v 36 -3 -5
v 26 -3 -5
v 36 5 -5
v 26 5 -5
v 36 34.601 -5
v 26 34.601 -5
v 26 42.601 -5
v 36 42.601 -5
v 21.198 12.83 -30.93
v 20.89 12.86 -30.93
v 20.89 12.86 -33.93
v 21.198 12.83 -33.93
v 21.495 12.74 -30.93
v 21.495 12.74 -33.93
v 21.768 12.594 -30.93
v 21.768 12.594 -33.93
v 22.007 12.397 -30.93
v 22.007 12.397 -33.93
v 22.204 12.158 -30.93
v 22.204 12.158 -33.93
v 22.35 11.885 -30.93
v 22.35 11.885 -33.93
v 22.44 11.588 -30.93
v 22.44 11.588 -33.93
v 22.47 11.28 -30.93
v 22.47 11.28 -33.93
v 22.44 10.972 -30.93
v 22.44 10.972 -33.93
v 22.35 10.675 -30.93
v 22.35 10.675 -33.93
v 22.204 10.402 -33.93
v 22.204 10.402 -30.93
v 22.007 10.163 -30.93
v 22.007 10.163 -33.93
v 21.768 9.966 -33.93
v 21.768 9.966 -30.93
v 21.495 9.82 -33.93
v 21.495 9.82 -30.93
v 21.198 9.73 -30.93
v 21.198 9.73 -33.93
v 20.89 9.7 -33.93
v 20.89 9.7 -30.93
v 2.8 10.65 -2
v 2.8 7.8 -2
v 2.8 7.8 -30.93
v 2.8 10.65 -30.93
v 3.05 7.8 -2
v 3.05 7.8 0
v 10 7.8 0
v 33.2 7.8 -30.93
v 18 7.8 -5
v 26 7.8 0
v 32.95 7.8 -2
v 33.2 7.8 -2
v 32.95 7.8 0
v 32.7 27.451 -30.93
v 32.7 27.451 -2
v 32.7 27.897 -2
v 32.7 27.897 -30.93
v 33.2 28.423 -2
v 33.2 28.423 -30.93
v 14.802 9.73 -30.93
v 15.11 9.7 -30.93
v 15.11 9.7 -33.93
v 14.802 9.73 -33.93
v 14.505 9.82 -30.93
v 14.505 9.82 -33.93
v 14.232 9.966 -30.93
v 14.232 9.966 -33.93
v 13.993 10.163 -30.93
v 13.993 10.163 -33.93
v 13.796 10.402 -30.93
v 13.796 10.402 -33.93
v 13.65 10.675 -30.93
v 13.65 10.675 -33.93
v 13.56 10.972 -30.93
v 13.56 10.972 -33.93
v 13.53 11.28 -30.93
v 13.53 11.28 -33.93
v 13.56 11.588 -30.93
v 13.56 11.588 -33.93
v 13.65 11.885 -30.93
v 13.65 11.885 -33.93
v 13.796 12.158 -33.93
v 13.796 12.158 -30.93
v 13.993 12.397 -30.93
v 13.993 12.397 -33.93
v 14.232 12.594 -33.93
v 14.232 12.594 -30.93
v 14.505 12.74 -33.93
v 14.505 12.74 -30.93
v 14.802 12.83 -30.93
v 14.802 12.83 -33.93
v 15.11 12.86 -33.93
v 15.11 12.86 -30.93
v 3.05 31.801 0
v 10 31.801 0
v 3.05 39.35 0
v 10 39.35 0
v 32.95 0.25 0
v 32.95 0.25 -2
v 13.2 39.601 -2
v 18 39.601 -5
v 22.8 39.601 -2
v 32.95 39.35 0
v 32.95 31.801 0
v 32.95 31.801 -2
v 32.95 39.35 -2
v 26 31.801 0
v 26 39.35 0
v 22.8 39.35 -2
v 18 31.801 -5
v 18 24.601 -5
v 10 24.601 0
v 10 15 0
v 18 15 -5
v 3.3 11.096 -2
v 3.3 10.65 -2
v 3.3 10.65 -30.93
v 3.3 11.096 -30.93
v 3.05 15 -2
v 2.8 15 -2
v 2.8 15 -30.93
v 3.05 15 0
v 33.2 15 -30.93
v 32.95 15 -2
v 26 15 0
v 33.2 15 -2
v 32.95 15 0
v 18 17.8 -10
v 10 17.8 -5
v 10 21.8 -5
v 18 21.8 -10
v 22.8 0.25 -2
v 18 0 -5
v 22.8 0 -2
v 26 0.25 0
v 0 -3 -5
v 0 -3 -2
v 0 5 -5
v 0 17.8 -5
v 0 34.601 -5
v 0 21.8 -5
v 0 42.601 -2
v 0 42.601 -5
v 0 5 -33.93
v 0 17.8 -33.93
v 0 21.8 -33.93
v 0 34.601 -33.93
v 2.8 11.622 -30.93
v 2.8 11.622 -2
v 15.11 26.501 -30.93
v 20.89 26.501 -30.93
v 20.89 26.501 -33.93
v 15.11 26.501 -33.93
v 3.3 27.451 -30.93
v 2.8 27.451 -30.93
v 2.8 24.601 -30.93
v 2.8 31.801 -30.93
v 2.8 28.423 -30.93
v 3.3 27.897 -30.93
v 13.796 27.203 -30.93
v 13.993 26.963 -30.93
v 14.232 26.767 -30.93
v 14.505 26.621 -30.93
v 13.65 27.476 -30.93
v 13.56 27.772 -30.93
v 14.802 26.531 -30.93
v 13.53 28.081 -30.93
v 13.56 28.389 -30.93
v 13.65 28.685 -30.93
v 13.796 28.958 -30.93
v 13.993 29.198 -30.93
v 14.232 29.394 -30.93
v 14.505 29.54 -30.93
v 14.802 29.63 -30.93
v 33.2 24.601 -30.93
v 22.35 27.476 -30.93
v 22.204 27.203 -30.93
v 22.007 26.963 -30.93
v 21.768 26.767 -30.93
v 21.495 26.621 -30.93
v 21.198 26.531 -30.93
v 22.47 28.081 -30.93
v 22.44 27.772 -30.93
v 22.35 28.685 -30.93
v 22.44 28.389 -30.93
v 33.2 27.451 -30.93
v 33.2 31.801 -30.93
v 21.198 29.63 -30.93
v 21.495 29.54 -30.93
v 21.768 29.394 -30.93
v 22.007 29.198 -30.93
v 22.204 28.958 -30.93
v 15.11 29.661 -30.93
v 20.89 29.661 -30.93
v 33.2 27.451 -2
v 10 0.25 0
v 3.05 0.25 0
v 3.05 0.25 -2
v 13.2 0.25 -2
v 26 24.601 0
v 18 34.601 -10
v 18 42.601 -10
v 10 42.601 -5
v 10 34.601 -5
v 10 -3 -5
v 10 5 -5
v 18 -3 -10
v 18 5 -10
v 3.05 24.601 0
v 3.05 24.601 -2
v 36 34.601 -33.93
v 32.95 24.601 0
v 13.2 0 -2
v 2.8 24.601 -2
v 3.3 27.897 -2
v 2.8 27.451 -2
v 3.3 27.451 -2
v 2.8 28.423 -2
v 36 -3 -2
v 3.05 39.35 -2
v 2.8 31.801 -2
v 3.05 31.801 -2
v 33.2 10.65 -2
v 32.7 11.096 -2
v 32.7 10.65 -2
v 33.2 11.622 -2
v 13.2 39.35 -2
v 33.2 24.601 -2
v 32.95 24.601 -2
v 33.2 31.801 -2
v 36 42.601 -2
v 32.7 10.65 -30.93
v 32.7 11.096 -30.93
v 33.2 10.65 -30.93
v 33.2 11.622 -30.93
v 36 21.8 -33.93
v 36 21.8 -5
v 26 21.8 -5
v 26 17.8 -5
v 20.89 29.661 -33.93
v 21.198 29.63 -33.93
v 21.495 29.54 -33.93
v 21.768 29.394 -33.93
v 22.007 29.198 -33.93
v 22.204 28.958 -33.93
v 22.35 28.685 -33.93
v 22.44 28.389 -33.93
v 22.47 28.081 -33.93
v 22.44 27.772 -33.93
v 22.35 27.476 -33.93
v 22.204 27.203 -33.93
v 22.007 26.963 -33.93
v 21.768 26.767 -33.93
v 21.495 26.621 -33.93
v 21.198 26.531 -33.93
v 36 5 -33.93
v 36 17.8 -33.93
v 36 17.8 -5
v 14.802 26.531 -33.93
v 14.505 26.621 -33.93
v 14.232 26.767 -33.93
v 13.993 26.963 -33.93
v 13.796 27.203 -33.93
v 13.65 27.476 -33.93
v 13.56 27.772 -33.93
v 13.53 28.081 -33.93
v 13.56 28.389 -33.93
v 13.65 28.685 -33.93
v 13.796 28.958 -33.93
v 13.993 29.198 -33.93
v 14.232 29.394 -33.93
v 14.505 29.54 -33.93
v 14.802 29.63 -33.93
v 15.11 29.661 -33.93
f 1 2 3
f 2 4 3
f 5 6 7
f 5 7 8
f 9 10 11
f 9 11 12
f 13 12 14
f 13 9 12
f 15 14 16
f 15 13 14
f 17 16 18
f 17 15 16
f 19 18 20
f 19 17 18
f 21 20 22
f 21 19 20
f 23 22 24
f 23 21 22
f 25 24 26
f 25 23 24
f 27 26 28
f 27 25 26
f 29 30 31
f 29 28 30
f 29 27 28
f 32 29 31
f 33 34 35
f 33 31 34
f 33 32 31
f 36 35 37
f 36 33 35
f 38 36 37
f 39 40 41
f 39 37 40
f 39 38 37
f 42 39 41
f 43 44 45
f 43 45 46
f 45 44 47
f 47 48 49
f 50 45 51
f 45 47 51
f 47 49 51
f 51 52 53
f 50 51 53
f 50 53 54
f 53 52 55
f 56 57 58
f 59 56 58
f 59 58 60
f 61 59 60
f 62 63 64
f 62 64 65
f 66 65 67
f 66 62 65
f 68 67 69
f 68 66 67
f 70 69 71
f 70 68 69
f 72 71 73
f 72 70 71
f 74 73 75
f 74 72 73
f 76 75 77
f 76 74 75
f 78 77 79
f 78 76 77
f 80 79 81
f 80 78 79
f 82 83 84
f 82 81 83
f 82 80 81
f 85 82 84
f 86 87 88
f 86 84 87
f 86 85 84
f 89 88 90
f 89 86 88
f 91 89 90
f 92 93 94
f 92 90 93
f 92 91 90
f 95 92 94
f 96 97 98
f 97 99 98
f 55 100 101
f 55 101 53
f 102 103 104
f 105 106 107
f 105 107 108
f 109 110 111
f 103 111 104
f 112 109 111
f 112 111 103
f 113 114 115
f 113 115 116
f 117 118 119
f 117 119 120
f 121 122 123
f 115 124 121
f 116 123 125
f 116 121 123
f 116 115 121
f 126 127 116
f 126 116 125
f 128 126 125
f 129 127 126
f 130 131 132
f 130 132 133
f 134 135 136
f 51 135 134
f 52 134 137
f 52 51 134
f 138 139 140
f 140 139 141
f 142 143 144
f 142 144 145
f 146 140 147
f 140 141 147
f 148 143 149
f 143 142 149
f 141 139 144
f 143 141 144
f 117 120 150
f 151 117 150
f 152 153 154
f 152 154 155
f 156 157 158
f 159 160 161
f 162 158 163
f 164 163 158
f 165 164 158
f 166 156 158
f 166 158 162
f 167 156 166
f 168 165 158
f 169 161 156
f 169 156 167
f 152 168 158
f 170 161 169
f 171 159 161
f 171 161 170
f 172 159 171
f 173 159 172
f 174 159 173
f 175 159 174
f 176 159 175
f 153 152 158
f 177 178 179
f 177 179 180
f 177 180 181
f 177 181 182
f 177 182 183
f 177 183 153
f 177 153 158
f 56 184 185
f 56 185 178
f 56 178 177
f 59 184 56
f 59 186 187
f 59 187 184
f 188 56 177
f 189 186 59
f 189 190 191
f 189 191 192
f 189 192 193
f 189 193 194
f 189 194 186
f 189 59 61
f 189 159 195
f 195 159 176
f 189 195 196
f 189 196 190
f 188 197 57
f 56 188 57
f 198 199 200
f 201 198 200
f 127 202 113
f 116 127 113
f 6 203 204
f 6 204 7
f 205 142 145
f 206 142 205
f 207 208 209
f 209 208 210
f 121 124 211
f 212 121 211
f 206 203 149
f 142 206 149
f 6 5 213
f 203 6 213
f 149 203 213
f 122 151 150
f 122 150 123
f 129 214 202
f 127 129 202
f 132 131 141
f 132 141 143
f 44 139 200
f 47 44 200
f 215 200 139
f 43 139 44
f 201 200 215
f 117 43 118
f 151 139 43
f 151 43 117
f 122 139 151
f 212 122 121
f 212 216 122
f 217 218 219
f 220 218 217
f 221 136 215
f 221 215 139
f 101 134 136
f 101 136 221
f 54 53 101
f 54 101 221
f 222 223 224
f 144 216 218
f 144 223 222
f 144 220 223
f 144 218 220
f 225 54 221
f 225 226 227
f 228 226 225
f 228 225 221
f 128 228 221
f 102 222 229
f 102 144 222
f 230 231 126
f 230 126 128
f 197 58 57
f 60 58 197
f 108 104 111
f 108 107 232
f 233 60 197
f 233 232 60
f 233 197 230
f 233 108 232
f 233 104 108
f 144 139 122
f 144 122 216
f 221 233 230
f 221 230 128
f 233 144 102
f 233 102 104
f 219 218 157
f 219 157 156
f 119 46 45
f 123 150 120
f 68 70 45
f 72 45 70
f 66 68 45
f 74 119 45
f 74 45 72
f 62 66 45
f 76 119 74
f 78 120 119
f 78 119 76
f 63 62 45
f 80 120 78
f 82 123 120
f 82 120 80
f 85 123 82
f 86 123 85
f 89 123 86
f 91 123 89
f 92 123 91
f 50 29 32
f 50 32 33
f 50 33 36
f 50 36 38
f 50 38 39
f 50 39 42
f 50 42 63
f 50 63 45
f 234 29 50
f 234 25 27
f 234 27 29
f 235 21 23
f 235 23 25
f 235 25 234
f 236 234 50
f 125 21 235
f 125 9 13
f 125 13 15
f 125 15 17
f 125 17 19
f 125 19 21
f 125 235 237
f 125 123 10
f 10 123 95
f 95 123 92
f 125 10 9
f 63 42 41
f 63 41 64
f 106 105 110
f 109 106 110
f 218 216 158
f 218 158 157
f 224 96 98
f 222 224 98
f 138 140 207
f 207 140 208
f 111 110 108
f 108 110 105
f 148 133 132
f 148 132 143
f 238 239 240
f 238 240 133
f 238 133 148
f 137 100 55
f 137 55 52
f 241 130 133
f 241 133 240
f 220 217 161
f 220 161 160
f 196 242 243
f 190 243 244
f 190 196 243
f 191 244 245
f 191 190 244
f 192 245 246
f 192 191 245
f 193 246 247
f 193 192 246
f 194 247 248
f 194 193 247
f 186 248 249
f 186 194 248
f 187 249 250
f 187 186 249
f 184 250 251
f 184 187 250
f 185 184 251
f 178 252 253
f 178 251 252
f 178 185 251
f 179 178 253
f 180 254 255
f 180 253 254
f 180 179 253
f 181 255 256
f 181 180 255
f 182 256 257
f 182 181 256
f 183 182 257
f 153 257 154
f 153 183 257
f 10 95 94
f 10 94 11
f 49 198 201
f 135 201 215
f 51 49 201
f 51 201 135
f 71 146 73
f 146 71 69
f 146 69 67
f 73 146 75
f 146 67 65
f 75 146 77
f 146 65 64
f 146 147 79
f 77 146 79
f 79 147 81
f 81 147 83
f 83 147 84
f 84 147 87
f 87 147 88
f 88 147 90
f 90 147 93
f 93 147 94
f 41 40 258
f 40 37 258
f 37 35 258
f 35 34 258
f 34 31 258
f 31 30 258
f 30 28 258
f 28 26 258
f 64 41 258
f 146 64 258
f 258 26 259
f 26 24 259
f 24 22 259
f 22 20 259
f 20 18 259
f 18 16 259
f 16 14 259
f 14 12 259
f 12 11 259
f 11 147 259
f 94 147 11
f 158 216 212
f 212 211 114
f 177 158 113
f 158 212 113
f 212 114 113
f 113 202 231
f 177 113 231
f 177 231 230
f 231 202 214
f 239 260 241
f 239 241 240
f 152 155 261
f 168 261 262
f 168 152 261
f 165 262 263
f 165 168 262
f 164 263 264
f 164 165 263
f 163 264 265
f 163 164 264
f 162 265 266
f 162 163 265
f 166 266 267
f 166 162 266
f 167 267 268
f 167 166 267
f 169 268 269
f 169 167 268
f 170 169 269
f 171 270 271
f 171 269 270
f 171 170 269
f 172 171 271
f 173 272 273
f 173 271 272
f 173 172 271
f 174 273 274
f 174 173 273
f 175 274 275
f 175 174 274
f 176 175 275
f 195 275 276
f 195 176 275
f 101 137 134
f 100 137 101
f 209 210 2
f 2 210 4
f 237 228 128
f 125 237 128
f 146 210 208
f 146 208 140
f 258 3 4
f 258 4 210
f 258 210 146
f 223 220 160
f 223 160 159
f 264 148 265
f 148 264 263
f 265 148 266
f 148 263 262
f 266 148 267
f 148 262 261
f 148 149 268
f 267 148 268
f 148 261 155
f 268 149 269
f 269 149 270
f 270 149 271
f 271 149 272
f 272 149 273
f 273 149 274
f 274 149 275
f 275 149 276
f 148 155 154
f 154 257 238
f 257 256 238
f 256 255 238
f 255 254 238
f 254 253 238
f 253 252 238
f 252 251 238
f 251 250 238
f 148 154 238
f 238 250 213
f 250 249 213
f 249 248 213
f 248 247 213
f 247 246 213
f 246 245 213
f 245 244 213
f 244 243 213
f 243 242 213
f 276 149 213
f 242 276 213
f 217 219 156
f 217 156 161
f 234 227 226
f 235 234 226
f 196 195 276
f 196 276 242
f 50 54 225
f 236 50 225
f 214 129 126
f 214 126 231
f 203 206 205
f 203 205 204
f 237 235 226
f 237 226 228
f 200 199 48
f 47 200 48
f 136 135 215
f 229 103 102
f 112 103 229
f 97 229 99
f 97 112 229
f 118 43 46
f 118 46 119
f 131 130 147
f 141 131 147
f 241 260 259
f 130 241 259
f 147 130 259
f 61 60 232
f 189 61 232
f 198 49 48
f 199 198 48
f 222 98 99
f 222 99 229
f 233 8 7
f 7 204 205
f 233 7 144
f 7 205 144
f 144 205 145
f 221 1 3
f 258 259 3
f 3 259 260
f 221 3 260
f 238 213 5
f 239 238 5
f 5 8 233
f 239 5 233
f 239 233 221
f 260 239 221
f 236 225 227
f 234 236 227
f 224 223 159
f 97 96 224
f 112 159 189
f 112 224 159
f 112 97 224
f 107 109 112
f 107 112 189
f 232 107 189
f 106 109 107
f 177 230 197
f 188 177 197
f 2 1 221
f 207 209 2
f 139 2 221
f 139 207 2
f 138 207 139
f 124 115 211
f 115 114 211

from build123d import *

# Parameters (mm, degrees)
SKETCH1_W           = 35.999968648
SKETCH1_H           = 39.60056603
BOSS_EXTRUDE1_DEPTH = 33.93
SKETCH2_W           = 28.93
SKETCH2_H           = 5
SKETCH2_H_2         = 4
CUT_EXTRUDE1_DEPTH  = 64.367558518
SKETCH3_W           = 16
SKETCH3_H           = 5
SKETCH3_H_2         = 4
CUT_EXTRUDE2_DEPTH  = 64.367558518
CUT_EXTRUDE3_DEPTH  = 61.369212453
SKETCH5_W           = 30.4
SKETCH5_H           = 7.2
CUT_EXTRUDE4_DEPTH  = 30.93
CUT_EXTRUDE5_DEPTH  = 62.813165851
BOSS_EXTRUDE2_REACH = 65.368
BOSS_EXTRUDE3_DEPTH = 5
BOSS_EXTRUDE4_REACH = 56.06
BOSS_EXTRUDE5_DEPTH = 5
BOSS_EXTRUDE6_DEPTH = 3
SKETCH12_W          = 35.999968648
SKETCH12_H          = 45.60056603
CUT_EXTRUDE6_DEPTH  = 2
SKETCH13_W          = 30.4
SKETCH13_H          = 39.6
SKETCH13_W_2        = 29.9
SKETCH13_H_2        = 39.1
CUT_EXTRUDE7_DEPTH  = 2


with BuildPart() as part:
    # Sketch1 → Boss-Extrude1 (new body)
    with BuildSketch(Plane.XY):
        with Locations((17.999984324, 19.800283015)):
            Rectangle(SKETCH1_W, SKETCH1_H)
    extrude(amount=-BOSS_EXTRUDE1_DEPTH)

    # Sketch2 → Cut-Extrude1 (cut, through all)
    with BuildSketch(Plane(origin=(35.999968648, 0, 0), x_dir=(0, 0, -1), z_dir=(1, 0, 0))):
        with Locations((19.465, 37.10056603)):
            Rectangle(SKETCH2_W, SKETCH2_H)
        with Locations((19.465, 19.800283015)):
            Rectangle(SKETCH2_W, SKETCH2_H_2)
        with Locations((19.465, 2.5)):
            Rectangle(SKETCH2_W, SKETCH2_H)
    extrude(amount=-CUT_EXTRUDE1_DEPTH, mode=Mode.SUBTRACT)

    # Sketch3 → Cut-Extrude2 (cut, through all)
    with BuildSketch(Plane.XY):
        with Locations((17.999984324, 37.10056603)):
            Rectangle(SKETCH3_W, SKETCH3_H)
        with Locations((17.999984324, 19.800283015)):
            Rectangle(SKETCH3_W, SKETCH3_H_2)
        with Locations((17.999984324, 2.5)):
            Rectangle(SKETCH3_W, SKETCH3_H)
    extrude(amount=-CUT_EXTRUDE2_DEPTH, mode=Mode.SUBTRACT)

    # Sketch4 → Cut-Extrude3 (cut, through all)
    with BuildSketch(Plane(origin=(0, 34.60056603, 0), x_dir=(1, 0, 0), z_dir=(0, 1, 0))):
        Polygon((9.999984324, 0), (17.999984324, 5), (25.999984324, 0), align=None)
    extrude(amount=-CUT_EXTRUDE3_DEPTH, mode=Mode.SUBTRACT)

    # Sketch5 → Cut-Extrude4 (cut)
    with BuildSketch(Plane.XY):
        with Locations((17.999984324, 11.4)):
            Rectangle(SKETCH5_W, SKETCH5_H)
        with Locations((17.999984324, 28.20056603)):
            Rectangle(SKETCH5_W, SKETCH5_H)
    extrude(amount=-CUT_EXTRUDE4_DEPTH, mode=Mode.SUBTRACT)

    # Sketch6 → Cut-Extrude5 (cut, through all)
    with BuildSketch(Plane.XY.offset(-30.93)):
        with BuildLine():
            Line((15.109984324, 29.66056603), (20.889984324, 29.66056603))
            ThreePointArc((20.889984324, 29.66056603), (22.469984324, 28.08056603), (20.889984324, 26.50056603))
            Line((20.889984324, 26.50056603), (15.109984324, 26.50056603))
            ThreePointArc((15.109984324, 26.50056603), (13.529984324, 28.08056603), (15.109984324, 29.66056603))
        make_face()
        with BuildLine():
            Line((15.109984324, 12.86), (20.889984324, 12.86))
            ThreePointArc((20.889984324, 12.86), (22.469984324, 11.28), (20.889984324, 9.7))
            Line((20.889984324, 9.7), (15.109984324, 9.7))
            ThreePointArc((15.109984324, 9.7), (13.529984324, 11.28), (15.109984324, 12.86))
        make_face()
    extrude(amount=-CUT_EXTRUDE5_DEPTH, mode=Mode.SUBTRACT)

    # Sketch7 → Boss-Extrude2 (add, up to next)
    with BuildSketch(Plane.XY, mode=Mode.PRIVATE) as boss_extrude2_sk1:
        Polygon((2.799984324, 28.422935376), (2.799984324, 27.45056603), (3.299984324, 27.45056603), (3.299984324, 27.896781183), align=None)
    boss_extrude2_tool1 = extrude(boss_extrude2_sk1.sketch, amount=-BOSS_EXTRUDE2_REACH, mode=Mode.PRIVATE) - part.part
    # Sketch7 → Boss-Extrude2 (add, up to next)
    with BuildSketch(Plane.XY, mode=Mode.PRIVATE) as boss_extrude2_sk2:
        Polygon((2.799984324, 11.622369346), (2.799984324, 10.65), (3.299984324, 10.65), (3.299984324, 11.096215154), align=None)
    boss_extrude2_tool2 = extrude(boss_extrude2_sk2.sketch, amount=-BOSS_EXTRUDE2_REACH, mode=Mode.PRIVATE) - part.part
    boss_extrude2_1 = boss_extrude2_tool1.solids().sort_by_distance((3.019076, 27.821475, 0))[0]
    add(boss_extrude2_1)
    boss_extrude2_2 = boss_extrude2_tool2.solids().sort_by_distance((3.019076, 11.020909, 0))[0]
    add(boss_extrude2_2)
    boss_extrude2 = boss_extrude2_1 + boss_extrude2_2  # Boss-Extrude2 as one shape, for the pattern or mirror that repeats it

    # Mirror1: Boss-Extrude2 across plane
    add(boss_extrude2.mirror(Plane(origin=(17.999984324, 0, 0), x_dir=(0, 0, 1), z_dir=(1, 0, 0))))

    # Sketch8 → Boss-Extrude3 (add)
    with BuildSketch(Plane(origin=(0, 34.60056603, 0), x_dir=(1, 0, 0), z_dir=(0, 1, 0))):
        Polygon((9.999984324, 5), (17.999984324, 10), (25.999984324, 5), (25.999984324, 0), (17.999984324, 5), (9.999984324, 0), align=None)
    extrude(amount=BOSS_EXTRUDE3_DEPTH)

    # Sketch9 → Boss-Extrude4 (add, up to next)
    with BuildSketch(Plane(origin=(0, 17.800283015, 0), x_dir=(1, 0, 0), z_dir=(0, 1, 0)), mode=Mode.PRIVATE) as boss_extrude4_sk1:
        Polygon((9.999984324, 5), (17.999984324, 10), (25.999984324, 5), (25.999984324, 0), (17.999984324, 5), (9.999984324, 0), align=None)
    boss_extrude4_tool1 = extrude(boss_extrude4_sk1.sketch, amount=BOSS_EXTRUDE4_REACH, mode=Mode.PRIVATE) - part.part
    add(boss_extrude4_tool1.solids().sort_by_distance((14.099984, 17.800283, -7.34))[0])

    # Sketch10 → Boss-Extrude5 (add)
    with BuildSketch(Plane.XZ.offset(-5)):
        Polygon((9.999984324, 0), (17.999984324, -5), (25.999984324, 0), (25.999984324, -5), (17.999984324, -10), (9.999984324, -5), align=None)
    extrude(amount=BOSS_EXTRUDE5_DEPTH)

    # Sketch11 → Boss-Extrude6 (add)
    with BuildSketch(Plane(origin=(0, 39.60056603, 0), x_dir=(1, 0, 0), z_dir=(0, 1, 0))):
        Polygon((0, 5), (9.999984324, 5), (17.999984324, 10), (25.999984324, 5), (35.999968648, 5), (35.999968648, 0), (0, 0), align=None)
    boss_extrude6 = extrude(amount=BOSS_EXTRUDE6_DEPTH)

    # Mirror2: Boss-Extrude6 across plane
    add(boss_extrude6.mirror(Plane.ZX.offset(19.800283015)))

    # Sketch12 → Cut-Extrude6 (cut)
    with BuildSketch(Plane.XY):
        with Locations((17.999984324, 19.800283015)):
            Rectangle(SKETCH12_W, SKETCH12_H)
        Polygon((2.799984324, 39.600283015), (33.199984324, 39.600283015), (33.199984324, 28.422935376), (32.699984324, 27.896781183), (32.699984324, 27.45056603), (33.199984324, 27.45056603), (33.199984324, 11.622369346), (32.699984324, 11.096215154), (32.699984324, 10.65), (33.199984324, 10.65), (33.199984324, 0.000283015), (2.799984324, 0.000283015), (2.799984324, 10.65), (3.299984324, 10.65), (3.299984324, 11.096215154), (2.799984324, 11.622369346), (2.799984324, 27.45056603), (3.299984324, 27.45056603), (3.299984324, 27.896781183), (2.799984324, 28.422935376), align=None, mode=Mode.SUBTRACT)
    extrude(amount=-CUT_EXTRUDE6_DEPTH, mode=Mode.SUBTRACT)

    # Sketch13 → Cut-Extrude7 (cut)
    with BuildSketch(Plane.XY):
        with Locations((17.999984324, 19.800283015)):
            Rectangle(SKETCH13_W, SKETCH13_H)
        with Locations((17.999984324, 19.800283015)):
            Rectangle(SKETCH13_W_2, SKETCH13_H_2, mode=Mode.SUBTRACT)
    extrude(amount=-CUT_EXTRUDE7_DEPTH, mode=Mode.SUBTRACT)


solid = part.part
